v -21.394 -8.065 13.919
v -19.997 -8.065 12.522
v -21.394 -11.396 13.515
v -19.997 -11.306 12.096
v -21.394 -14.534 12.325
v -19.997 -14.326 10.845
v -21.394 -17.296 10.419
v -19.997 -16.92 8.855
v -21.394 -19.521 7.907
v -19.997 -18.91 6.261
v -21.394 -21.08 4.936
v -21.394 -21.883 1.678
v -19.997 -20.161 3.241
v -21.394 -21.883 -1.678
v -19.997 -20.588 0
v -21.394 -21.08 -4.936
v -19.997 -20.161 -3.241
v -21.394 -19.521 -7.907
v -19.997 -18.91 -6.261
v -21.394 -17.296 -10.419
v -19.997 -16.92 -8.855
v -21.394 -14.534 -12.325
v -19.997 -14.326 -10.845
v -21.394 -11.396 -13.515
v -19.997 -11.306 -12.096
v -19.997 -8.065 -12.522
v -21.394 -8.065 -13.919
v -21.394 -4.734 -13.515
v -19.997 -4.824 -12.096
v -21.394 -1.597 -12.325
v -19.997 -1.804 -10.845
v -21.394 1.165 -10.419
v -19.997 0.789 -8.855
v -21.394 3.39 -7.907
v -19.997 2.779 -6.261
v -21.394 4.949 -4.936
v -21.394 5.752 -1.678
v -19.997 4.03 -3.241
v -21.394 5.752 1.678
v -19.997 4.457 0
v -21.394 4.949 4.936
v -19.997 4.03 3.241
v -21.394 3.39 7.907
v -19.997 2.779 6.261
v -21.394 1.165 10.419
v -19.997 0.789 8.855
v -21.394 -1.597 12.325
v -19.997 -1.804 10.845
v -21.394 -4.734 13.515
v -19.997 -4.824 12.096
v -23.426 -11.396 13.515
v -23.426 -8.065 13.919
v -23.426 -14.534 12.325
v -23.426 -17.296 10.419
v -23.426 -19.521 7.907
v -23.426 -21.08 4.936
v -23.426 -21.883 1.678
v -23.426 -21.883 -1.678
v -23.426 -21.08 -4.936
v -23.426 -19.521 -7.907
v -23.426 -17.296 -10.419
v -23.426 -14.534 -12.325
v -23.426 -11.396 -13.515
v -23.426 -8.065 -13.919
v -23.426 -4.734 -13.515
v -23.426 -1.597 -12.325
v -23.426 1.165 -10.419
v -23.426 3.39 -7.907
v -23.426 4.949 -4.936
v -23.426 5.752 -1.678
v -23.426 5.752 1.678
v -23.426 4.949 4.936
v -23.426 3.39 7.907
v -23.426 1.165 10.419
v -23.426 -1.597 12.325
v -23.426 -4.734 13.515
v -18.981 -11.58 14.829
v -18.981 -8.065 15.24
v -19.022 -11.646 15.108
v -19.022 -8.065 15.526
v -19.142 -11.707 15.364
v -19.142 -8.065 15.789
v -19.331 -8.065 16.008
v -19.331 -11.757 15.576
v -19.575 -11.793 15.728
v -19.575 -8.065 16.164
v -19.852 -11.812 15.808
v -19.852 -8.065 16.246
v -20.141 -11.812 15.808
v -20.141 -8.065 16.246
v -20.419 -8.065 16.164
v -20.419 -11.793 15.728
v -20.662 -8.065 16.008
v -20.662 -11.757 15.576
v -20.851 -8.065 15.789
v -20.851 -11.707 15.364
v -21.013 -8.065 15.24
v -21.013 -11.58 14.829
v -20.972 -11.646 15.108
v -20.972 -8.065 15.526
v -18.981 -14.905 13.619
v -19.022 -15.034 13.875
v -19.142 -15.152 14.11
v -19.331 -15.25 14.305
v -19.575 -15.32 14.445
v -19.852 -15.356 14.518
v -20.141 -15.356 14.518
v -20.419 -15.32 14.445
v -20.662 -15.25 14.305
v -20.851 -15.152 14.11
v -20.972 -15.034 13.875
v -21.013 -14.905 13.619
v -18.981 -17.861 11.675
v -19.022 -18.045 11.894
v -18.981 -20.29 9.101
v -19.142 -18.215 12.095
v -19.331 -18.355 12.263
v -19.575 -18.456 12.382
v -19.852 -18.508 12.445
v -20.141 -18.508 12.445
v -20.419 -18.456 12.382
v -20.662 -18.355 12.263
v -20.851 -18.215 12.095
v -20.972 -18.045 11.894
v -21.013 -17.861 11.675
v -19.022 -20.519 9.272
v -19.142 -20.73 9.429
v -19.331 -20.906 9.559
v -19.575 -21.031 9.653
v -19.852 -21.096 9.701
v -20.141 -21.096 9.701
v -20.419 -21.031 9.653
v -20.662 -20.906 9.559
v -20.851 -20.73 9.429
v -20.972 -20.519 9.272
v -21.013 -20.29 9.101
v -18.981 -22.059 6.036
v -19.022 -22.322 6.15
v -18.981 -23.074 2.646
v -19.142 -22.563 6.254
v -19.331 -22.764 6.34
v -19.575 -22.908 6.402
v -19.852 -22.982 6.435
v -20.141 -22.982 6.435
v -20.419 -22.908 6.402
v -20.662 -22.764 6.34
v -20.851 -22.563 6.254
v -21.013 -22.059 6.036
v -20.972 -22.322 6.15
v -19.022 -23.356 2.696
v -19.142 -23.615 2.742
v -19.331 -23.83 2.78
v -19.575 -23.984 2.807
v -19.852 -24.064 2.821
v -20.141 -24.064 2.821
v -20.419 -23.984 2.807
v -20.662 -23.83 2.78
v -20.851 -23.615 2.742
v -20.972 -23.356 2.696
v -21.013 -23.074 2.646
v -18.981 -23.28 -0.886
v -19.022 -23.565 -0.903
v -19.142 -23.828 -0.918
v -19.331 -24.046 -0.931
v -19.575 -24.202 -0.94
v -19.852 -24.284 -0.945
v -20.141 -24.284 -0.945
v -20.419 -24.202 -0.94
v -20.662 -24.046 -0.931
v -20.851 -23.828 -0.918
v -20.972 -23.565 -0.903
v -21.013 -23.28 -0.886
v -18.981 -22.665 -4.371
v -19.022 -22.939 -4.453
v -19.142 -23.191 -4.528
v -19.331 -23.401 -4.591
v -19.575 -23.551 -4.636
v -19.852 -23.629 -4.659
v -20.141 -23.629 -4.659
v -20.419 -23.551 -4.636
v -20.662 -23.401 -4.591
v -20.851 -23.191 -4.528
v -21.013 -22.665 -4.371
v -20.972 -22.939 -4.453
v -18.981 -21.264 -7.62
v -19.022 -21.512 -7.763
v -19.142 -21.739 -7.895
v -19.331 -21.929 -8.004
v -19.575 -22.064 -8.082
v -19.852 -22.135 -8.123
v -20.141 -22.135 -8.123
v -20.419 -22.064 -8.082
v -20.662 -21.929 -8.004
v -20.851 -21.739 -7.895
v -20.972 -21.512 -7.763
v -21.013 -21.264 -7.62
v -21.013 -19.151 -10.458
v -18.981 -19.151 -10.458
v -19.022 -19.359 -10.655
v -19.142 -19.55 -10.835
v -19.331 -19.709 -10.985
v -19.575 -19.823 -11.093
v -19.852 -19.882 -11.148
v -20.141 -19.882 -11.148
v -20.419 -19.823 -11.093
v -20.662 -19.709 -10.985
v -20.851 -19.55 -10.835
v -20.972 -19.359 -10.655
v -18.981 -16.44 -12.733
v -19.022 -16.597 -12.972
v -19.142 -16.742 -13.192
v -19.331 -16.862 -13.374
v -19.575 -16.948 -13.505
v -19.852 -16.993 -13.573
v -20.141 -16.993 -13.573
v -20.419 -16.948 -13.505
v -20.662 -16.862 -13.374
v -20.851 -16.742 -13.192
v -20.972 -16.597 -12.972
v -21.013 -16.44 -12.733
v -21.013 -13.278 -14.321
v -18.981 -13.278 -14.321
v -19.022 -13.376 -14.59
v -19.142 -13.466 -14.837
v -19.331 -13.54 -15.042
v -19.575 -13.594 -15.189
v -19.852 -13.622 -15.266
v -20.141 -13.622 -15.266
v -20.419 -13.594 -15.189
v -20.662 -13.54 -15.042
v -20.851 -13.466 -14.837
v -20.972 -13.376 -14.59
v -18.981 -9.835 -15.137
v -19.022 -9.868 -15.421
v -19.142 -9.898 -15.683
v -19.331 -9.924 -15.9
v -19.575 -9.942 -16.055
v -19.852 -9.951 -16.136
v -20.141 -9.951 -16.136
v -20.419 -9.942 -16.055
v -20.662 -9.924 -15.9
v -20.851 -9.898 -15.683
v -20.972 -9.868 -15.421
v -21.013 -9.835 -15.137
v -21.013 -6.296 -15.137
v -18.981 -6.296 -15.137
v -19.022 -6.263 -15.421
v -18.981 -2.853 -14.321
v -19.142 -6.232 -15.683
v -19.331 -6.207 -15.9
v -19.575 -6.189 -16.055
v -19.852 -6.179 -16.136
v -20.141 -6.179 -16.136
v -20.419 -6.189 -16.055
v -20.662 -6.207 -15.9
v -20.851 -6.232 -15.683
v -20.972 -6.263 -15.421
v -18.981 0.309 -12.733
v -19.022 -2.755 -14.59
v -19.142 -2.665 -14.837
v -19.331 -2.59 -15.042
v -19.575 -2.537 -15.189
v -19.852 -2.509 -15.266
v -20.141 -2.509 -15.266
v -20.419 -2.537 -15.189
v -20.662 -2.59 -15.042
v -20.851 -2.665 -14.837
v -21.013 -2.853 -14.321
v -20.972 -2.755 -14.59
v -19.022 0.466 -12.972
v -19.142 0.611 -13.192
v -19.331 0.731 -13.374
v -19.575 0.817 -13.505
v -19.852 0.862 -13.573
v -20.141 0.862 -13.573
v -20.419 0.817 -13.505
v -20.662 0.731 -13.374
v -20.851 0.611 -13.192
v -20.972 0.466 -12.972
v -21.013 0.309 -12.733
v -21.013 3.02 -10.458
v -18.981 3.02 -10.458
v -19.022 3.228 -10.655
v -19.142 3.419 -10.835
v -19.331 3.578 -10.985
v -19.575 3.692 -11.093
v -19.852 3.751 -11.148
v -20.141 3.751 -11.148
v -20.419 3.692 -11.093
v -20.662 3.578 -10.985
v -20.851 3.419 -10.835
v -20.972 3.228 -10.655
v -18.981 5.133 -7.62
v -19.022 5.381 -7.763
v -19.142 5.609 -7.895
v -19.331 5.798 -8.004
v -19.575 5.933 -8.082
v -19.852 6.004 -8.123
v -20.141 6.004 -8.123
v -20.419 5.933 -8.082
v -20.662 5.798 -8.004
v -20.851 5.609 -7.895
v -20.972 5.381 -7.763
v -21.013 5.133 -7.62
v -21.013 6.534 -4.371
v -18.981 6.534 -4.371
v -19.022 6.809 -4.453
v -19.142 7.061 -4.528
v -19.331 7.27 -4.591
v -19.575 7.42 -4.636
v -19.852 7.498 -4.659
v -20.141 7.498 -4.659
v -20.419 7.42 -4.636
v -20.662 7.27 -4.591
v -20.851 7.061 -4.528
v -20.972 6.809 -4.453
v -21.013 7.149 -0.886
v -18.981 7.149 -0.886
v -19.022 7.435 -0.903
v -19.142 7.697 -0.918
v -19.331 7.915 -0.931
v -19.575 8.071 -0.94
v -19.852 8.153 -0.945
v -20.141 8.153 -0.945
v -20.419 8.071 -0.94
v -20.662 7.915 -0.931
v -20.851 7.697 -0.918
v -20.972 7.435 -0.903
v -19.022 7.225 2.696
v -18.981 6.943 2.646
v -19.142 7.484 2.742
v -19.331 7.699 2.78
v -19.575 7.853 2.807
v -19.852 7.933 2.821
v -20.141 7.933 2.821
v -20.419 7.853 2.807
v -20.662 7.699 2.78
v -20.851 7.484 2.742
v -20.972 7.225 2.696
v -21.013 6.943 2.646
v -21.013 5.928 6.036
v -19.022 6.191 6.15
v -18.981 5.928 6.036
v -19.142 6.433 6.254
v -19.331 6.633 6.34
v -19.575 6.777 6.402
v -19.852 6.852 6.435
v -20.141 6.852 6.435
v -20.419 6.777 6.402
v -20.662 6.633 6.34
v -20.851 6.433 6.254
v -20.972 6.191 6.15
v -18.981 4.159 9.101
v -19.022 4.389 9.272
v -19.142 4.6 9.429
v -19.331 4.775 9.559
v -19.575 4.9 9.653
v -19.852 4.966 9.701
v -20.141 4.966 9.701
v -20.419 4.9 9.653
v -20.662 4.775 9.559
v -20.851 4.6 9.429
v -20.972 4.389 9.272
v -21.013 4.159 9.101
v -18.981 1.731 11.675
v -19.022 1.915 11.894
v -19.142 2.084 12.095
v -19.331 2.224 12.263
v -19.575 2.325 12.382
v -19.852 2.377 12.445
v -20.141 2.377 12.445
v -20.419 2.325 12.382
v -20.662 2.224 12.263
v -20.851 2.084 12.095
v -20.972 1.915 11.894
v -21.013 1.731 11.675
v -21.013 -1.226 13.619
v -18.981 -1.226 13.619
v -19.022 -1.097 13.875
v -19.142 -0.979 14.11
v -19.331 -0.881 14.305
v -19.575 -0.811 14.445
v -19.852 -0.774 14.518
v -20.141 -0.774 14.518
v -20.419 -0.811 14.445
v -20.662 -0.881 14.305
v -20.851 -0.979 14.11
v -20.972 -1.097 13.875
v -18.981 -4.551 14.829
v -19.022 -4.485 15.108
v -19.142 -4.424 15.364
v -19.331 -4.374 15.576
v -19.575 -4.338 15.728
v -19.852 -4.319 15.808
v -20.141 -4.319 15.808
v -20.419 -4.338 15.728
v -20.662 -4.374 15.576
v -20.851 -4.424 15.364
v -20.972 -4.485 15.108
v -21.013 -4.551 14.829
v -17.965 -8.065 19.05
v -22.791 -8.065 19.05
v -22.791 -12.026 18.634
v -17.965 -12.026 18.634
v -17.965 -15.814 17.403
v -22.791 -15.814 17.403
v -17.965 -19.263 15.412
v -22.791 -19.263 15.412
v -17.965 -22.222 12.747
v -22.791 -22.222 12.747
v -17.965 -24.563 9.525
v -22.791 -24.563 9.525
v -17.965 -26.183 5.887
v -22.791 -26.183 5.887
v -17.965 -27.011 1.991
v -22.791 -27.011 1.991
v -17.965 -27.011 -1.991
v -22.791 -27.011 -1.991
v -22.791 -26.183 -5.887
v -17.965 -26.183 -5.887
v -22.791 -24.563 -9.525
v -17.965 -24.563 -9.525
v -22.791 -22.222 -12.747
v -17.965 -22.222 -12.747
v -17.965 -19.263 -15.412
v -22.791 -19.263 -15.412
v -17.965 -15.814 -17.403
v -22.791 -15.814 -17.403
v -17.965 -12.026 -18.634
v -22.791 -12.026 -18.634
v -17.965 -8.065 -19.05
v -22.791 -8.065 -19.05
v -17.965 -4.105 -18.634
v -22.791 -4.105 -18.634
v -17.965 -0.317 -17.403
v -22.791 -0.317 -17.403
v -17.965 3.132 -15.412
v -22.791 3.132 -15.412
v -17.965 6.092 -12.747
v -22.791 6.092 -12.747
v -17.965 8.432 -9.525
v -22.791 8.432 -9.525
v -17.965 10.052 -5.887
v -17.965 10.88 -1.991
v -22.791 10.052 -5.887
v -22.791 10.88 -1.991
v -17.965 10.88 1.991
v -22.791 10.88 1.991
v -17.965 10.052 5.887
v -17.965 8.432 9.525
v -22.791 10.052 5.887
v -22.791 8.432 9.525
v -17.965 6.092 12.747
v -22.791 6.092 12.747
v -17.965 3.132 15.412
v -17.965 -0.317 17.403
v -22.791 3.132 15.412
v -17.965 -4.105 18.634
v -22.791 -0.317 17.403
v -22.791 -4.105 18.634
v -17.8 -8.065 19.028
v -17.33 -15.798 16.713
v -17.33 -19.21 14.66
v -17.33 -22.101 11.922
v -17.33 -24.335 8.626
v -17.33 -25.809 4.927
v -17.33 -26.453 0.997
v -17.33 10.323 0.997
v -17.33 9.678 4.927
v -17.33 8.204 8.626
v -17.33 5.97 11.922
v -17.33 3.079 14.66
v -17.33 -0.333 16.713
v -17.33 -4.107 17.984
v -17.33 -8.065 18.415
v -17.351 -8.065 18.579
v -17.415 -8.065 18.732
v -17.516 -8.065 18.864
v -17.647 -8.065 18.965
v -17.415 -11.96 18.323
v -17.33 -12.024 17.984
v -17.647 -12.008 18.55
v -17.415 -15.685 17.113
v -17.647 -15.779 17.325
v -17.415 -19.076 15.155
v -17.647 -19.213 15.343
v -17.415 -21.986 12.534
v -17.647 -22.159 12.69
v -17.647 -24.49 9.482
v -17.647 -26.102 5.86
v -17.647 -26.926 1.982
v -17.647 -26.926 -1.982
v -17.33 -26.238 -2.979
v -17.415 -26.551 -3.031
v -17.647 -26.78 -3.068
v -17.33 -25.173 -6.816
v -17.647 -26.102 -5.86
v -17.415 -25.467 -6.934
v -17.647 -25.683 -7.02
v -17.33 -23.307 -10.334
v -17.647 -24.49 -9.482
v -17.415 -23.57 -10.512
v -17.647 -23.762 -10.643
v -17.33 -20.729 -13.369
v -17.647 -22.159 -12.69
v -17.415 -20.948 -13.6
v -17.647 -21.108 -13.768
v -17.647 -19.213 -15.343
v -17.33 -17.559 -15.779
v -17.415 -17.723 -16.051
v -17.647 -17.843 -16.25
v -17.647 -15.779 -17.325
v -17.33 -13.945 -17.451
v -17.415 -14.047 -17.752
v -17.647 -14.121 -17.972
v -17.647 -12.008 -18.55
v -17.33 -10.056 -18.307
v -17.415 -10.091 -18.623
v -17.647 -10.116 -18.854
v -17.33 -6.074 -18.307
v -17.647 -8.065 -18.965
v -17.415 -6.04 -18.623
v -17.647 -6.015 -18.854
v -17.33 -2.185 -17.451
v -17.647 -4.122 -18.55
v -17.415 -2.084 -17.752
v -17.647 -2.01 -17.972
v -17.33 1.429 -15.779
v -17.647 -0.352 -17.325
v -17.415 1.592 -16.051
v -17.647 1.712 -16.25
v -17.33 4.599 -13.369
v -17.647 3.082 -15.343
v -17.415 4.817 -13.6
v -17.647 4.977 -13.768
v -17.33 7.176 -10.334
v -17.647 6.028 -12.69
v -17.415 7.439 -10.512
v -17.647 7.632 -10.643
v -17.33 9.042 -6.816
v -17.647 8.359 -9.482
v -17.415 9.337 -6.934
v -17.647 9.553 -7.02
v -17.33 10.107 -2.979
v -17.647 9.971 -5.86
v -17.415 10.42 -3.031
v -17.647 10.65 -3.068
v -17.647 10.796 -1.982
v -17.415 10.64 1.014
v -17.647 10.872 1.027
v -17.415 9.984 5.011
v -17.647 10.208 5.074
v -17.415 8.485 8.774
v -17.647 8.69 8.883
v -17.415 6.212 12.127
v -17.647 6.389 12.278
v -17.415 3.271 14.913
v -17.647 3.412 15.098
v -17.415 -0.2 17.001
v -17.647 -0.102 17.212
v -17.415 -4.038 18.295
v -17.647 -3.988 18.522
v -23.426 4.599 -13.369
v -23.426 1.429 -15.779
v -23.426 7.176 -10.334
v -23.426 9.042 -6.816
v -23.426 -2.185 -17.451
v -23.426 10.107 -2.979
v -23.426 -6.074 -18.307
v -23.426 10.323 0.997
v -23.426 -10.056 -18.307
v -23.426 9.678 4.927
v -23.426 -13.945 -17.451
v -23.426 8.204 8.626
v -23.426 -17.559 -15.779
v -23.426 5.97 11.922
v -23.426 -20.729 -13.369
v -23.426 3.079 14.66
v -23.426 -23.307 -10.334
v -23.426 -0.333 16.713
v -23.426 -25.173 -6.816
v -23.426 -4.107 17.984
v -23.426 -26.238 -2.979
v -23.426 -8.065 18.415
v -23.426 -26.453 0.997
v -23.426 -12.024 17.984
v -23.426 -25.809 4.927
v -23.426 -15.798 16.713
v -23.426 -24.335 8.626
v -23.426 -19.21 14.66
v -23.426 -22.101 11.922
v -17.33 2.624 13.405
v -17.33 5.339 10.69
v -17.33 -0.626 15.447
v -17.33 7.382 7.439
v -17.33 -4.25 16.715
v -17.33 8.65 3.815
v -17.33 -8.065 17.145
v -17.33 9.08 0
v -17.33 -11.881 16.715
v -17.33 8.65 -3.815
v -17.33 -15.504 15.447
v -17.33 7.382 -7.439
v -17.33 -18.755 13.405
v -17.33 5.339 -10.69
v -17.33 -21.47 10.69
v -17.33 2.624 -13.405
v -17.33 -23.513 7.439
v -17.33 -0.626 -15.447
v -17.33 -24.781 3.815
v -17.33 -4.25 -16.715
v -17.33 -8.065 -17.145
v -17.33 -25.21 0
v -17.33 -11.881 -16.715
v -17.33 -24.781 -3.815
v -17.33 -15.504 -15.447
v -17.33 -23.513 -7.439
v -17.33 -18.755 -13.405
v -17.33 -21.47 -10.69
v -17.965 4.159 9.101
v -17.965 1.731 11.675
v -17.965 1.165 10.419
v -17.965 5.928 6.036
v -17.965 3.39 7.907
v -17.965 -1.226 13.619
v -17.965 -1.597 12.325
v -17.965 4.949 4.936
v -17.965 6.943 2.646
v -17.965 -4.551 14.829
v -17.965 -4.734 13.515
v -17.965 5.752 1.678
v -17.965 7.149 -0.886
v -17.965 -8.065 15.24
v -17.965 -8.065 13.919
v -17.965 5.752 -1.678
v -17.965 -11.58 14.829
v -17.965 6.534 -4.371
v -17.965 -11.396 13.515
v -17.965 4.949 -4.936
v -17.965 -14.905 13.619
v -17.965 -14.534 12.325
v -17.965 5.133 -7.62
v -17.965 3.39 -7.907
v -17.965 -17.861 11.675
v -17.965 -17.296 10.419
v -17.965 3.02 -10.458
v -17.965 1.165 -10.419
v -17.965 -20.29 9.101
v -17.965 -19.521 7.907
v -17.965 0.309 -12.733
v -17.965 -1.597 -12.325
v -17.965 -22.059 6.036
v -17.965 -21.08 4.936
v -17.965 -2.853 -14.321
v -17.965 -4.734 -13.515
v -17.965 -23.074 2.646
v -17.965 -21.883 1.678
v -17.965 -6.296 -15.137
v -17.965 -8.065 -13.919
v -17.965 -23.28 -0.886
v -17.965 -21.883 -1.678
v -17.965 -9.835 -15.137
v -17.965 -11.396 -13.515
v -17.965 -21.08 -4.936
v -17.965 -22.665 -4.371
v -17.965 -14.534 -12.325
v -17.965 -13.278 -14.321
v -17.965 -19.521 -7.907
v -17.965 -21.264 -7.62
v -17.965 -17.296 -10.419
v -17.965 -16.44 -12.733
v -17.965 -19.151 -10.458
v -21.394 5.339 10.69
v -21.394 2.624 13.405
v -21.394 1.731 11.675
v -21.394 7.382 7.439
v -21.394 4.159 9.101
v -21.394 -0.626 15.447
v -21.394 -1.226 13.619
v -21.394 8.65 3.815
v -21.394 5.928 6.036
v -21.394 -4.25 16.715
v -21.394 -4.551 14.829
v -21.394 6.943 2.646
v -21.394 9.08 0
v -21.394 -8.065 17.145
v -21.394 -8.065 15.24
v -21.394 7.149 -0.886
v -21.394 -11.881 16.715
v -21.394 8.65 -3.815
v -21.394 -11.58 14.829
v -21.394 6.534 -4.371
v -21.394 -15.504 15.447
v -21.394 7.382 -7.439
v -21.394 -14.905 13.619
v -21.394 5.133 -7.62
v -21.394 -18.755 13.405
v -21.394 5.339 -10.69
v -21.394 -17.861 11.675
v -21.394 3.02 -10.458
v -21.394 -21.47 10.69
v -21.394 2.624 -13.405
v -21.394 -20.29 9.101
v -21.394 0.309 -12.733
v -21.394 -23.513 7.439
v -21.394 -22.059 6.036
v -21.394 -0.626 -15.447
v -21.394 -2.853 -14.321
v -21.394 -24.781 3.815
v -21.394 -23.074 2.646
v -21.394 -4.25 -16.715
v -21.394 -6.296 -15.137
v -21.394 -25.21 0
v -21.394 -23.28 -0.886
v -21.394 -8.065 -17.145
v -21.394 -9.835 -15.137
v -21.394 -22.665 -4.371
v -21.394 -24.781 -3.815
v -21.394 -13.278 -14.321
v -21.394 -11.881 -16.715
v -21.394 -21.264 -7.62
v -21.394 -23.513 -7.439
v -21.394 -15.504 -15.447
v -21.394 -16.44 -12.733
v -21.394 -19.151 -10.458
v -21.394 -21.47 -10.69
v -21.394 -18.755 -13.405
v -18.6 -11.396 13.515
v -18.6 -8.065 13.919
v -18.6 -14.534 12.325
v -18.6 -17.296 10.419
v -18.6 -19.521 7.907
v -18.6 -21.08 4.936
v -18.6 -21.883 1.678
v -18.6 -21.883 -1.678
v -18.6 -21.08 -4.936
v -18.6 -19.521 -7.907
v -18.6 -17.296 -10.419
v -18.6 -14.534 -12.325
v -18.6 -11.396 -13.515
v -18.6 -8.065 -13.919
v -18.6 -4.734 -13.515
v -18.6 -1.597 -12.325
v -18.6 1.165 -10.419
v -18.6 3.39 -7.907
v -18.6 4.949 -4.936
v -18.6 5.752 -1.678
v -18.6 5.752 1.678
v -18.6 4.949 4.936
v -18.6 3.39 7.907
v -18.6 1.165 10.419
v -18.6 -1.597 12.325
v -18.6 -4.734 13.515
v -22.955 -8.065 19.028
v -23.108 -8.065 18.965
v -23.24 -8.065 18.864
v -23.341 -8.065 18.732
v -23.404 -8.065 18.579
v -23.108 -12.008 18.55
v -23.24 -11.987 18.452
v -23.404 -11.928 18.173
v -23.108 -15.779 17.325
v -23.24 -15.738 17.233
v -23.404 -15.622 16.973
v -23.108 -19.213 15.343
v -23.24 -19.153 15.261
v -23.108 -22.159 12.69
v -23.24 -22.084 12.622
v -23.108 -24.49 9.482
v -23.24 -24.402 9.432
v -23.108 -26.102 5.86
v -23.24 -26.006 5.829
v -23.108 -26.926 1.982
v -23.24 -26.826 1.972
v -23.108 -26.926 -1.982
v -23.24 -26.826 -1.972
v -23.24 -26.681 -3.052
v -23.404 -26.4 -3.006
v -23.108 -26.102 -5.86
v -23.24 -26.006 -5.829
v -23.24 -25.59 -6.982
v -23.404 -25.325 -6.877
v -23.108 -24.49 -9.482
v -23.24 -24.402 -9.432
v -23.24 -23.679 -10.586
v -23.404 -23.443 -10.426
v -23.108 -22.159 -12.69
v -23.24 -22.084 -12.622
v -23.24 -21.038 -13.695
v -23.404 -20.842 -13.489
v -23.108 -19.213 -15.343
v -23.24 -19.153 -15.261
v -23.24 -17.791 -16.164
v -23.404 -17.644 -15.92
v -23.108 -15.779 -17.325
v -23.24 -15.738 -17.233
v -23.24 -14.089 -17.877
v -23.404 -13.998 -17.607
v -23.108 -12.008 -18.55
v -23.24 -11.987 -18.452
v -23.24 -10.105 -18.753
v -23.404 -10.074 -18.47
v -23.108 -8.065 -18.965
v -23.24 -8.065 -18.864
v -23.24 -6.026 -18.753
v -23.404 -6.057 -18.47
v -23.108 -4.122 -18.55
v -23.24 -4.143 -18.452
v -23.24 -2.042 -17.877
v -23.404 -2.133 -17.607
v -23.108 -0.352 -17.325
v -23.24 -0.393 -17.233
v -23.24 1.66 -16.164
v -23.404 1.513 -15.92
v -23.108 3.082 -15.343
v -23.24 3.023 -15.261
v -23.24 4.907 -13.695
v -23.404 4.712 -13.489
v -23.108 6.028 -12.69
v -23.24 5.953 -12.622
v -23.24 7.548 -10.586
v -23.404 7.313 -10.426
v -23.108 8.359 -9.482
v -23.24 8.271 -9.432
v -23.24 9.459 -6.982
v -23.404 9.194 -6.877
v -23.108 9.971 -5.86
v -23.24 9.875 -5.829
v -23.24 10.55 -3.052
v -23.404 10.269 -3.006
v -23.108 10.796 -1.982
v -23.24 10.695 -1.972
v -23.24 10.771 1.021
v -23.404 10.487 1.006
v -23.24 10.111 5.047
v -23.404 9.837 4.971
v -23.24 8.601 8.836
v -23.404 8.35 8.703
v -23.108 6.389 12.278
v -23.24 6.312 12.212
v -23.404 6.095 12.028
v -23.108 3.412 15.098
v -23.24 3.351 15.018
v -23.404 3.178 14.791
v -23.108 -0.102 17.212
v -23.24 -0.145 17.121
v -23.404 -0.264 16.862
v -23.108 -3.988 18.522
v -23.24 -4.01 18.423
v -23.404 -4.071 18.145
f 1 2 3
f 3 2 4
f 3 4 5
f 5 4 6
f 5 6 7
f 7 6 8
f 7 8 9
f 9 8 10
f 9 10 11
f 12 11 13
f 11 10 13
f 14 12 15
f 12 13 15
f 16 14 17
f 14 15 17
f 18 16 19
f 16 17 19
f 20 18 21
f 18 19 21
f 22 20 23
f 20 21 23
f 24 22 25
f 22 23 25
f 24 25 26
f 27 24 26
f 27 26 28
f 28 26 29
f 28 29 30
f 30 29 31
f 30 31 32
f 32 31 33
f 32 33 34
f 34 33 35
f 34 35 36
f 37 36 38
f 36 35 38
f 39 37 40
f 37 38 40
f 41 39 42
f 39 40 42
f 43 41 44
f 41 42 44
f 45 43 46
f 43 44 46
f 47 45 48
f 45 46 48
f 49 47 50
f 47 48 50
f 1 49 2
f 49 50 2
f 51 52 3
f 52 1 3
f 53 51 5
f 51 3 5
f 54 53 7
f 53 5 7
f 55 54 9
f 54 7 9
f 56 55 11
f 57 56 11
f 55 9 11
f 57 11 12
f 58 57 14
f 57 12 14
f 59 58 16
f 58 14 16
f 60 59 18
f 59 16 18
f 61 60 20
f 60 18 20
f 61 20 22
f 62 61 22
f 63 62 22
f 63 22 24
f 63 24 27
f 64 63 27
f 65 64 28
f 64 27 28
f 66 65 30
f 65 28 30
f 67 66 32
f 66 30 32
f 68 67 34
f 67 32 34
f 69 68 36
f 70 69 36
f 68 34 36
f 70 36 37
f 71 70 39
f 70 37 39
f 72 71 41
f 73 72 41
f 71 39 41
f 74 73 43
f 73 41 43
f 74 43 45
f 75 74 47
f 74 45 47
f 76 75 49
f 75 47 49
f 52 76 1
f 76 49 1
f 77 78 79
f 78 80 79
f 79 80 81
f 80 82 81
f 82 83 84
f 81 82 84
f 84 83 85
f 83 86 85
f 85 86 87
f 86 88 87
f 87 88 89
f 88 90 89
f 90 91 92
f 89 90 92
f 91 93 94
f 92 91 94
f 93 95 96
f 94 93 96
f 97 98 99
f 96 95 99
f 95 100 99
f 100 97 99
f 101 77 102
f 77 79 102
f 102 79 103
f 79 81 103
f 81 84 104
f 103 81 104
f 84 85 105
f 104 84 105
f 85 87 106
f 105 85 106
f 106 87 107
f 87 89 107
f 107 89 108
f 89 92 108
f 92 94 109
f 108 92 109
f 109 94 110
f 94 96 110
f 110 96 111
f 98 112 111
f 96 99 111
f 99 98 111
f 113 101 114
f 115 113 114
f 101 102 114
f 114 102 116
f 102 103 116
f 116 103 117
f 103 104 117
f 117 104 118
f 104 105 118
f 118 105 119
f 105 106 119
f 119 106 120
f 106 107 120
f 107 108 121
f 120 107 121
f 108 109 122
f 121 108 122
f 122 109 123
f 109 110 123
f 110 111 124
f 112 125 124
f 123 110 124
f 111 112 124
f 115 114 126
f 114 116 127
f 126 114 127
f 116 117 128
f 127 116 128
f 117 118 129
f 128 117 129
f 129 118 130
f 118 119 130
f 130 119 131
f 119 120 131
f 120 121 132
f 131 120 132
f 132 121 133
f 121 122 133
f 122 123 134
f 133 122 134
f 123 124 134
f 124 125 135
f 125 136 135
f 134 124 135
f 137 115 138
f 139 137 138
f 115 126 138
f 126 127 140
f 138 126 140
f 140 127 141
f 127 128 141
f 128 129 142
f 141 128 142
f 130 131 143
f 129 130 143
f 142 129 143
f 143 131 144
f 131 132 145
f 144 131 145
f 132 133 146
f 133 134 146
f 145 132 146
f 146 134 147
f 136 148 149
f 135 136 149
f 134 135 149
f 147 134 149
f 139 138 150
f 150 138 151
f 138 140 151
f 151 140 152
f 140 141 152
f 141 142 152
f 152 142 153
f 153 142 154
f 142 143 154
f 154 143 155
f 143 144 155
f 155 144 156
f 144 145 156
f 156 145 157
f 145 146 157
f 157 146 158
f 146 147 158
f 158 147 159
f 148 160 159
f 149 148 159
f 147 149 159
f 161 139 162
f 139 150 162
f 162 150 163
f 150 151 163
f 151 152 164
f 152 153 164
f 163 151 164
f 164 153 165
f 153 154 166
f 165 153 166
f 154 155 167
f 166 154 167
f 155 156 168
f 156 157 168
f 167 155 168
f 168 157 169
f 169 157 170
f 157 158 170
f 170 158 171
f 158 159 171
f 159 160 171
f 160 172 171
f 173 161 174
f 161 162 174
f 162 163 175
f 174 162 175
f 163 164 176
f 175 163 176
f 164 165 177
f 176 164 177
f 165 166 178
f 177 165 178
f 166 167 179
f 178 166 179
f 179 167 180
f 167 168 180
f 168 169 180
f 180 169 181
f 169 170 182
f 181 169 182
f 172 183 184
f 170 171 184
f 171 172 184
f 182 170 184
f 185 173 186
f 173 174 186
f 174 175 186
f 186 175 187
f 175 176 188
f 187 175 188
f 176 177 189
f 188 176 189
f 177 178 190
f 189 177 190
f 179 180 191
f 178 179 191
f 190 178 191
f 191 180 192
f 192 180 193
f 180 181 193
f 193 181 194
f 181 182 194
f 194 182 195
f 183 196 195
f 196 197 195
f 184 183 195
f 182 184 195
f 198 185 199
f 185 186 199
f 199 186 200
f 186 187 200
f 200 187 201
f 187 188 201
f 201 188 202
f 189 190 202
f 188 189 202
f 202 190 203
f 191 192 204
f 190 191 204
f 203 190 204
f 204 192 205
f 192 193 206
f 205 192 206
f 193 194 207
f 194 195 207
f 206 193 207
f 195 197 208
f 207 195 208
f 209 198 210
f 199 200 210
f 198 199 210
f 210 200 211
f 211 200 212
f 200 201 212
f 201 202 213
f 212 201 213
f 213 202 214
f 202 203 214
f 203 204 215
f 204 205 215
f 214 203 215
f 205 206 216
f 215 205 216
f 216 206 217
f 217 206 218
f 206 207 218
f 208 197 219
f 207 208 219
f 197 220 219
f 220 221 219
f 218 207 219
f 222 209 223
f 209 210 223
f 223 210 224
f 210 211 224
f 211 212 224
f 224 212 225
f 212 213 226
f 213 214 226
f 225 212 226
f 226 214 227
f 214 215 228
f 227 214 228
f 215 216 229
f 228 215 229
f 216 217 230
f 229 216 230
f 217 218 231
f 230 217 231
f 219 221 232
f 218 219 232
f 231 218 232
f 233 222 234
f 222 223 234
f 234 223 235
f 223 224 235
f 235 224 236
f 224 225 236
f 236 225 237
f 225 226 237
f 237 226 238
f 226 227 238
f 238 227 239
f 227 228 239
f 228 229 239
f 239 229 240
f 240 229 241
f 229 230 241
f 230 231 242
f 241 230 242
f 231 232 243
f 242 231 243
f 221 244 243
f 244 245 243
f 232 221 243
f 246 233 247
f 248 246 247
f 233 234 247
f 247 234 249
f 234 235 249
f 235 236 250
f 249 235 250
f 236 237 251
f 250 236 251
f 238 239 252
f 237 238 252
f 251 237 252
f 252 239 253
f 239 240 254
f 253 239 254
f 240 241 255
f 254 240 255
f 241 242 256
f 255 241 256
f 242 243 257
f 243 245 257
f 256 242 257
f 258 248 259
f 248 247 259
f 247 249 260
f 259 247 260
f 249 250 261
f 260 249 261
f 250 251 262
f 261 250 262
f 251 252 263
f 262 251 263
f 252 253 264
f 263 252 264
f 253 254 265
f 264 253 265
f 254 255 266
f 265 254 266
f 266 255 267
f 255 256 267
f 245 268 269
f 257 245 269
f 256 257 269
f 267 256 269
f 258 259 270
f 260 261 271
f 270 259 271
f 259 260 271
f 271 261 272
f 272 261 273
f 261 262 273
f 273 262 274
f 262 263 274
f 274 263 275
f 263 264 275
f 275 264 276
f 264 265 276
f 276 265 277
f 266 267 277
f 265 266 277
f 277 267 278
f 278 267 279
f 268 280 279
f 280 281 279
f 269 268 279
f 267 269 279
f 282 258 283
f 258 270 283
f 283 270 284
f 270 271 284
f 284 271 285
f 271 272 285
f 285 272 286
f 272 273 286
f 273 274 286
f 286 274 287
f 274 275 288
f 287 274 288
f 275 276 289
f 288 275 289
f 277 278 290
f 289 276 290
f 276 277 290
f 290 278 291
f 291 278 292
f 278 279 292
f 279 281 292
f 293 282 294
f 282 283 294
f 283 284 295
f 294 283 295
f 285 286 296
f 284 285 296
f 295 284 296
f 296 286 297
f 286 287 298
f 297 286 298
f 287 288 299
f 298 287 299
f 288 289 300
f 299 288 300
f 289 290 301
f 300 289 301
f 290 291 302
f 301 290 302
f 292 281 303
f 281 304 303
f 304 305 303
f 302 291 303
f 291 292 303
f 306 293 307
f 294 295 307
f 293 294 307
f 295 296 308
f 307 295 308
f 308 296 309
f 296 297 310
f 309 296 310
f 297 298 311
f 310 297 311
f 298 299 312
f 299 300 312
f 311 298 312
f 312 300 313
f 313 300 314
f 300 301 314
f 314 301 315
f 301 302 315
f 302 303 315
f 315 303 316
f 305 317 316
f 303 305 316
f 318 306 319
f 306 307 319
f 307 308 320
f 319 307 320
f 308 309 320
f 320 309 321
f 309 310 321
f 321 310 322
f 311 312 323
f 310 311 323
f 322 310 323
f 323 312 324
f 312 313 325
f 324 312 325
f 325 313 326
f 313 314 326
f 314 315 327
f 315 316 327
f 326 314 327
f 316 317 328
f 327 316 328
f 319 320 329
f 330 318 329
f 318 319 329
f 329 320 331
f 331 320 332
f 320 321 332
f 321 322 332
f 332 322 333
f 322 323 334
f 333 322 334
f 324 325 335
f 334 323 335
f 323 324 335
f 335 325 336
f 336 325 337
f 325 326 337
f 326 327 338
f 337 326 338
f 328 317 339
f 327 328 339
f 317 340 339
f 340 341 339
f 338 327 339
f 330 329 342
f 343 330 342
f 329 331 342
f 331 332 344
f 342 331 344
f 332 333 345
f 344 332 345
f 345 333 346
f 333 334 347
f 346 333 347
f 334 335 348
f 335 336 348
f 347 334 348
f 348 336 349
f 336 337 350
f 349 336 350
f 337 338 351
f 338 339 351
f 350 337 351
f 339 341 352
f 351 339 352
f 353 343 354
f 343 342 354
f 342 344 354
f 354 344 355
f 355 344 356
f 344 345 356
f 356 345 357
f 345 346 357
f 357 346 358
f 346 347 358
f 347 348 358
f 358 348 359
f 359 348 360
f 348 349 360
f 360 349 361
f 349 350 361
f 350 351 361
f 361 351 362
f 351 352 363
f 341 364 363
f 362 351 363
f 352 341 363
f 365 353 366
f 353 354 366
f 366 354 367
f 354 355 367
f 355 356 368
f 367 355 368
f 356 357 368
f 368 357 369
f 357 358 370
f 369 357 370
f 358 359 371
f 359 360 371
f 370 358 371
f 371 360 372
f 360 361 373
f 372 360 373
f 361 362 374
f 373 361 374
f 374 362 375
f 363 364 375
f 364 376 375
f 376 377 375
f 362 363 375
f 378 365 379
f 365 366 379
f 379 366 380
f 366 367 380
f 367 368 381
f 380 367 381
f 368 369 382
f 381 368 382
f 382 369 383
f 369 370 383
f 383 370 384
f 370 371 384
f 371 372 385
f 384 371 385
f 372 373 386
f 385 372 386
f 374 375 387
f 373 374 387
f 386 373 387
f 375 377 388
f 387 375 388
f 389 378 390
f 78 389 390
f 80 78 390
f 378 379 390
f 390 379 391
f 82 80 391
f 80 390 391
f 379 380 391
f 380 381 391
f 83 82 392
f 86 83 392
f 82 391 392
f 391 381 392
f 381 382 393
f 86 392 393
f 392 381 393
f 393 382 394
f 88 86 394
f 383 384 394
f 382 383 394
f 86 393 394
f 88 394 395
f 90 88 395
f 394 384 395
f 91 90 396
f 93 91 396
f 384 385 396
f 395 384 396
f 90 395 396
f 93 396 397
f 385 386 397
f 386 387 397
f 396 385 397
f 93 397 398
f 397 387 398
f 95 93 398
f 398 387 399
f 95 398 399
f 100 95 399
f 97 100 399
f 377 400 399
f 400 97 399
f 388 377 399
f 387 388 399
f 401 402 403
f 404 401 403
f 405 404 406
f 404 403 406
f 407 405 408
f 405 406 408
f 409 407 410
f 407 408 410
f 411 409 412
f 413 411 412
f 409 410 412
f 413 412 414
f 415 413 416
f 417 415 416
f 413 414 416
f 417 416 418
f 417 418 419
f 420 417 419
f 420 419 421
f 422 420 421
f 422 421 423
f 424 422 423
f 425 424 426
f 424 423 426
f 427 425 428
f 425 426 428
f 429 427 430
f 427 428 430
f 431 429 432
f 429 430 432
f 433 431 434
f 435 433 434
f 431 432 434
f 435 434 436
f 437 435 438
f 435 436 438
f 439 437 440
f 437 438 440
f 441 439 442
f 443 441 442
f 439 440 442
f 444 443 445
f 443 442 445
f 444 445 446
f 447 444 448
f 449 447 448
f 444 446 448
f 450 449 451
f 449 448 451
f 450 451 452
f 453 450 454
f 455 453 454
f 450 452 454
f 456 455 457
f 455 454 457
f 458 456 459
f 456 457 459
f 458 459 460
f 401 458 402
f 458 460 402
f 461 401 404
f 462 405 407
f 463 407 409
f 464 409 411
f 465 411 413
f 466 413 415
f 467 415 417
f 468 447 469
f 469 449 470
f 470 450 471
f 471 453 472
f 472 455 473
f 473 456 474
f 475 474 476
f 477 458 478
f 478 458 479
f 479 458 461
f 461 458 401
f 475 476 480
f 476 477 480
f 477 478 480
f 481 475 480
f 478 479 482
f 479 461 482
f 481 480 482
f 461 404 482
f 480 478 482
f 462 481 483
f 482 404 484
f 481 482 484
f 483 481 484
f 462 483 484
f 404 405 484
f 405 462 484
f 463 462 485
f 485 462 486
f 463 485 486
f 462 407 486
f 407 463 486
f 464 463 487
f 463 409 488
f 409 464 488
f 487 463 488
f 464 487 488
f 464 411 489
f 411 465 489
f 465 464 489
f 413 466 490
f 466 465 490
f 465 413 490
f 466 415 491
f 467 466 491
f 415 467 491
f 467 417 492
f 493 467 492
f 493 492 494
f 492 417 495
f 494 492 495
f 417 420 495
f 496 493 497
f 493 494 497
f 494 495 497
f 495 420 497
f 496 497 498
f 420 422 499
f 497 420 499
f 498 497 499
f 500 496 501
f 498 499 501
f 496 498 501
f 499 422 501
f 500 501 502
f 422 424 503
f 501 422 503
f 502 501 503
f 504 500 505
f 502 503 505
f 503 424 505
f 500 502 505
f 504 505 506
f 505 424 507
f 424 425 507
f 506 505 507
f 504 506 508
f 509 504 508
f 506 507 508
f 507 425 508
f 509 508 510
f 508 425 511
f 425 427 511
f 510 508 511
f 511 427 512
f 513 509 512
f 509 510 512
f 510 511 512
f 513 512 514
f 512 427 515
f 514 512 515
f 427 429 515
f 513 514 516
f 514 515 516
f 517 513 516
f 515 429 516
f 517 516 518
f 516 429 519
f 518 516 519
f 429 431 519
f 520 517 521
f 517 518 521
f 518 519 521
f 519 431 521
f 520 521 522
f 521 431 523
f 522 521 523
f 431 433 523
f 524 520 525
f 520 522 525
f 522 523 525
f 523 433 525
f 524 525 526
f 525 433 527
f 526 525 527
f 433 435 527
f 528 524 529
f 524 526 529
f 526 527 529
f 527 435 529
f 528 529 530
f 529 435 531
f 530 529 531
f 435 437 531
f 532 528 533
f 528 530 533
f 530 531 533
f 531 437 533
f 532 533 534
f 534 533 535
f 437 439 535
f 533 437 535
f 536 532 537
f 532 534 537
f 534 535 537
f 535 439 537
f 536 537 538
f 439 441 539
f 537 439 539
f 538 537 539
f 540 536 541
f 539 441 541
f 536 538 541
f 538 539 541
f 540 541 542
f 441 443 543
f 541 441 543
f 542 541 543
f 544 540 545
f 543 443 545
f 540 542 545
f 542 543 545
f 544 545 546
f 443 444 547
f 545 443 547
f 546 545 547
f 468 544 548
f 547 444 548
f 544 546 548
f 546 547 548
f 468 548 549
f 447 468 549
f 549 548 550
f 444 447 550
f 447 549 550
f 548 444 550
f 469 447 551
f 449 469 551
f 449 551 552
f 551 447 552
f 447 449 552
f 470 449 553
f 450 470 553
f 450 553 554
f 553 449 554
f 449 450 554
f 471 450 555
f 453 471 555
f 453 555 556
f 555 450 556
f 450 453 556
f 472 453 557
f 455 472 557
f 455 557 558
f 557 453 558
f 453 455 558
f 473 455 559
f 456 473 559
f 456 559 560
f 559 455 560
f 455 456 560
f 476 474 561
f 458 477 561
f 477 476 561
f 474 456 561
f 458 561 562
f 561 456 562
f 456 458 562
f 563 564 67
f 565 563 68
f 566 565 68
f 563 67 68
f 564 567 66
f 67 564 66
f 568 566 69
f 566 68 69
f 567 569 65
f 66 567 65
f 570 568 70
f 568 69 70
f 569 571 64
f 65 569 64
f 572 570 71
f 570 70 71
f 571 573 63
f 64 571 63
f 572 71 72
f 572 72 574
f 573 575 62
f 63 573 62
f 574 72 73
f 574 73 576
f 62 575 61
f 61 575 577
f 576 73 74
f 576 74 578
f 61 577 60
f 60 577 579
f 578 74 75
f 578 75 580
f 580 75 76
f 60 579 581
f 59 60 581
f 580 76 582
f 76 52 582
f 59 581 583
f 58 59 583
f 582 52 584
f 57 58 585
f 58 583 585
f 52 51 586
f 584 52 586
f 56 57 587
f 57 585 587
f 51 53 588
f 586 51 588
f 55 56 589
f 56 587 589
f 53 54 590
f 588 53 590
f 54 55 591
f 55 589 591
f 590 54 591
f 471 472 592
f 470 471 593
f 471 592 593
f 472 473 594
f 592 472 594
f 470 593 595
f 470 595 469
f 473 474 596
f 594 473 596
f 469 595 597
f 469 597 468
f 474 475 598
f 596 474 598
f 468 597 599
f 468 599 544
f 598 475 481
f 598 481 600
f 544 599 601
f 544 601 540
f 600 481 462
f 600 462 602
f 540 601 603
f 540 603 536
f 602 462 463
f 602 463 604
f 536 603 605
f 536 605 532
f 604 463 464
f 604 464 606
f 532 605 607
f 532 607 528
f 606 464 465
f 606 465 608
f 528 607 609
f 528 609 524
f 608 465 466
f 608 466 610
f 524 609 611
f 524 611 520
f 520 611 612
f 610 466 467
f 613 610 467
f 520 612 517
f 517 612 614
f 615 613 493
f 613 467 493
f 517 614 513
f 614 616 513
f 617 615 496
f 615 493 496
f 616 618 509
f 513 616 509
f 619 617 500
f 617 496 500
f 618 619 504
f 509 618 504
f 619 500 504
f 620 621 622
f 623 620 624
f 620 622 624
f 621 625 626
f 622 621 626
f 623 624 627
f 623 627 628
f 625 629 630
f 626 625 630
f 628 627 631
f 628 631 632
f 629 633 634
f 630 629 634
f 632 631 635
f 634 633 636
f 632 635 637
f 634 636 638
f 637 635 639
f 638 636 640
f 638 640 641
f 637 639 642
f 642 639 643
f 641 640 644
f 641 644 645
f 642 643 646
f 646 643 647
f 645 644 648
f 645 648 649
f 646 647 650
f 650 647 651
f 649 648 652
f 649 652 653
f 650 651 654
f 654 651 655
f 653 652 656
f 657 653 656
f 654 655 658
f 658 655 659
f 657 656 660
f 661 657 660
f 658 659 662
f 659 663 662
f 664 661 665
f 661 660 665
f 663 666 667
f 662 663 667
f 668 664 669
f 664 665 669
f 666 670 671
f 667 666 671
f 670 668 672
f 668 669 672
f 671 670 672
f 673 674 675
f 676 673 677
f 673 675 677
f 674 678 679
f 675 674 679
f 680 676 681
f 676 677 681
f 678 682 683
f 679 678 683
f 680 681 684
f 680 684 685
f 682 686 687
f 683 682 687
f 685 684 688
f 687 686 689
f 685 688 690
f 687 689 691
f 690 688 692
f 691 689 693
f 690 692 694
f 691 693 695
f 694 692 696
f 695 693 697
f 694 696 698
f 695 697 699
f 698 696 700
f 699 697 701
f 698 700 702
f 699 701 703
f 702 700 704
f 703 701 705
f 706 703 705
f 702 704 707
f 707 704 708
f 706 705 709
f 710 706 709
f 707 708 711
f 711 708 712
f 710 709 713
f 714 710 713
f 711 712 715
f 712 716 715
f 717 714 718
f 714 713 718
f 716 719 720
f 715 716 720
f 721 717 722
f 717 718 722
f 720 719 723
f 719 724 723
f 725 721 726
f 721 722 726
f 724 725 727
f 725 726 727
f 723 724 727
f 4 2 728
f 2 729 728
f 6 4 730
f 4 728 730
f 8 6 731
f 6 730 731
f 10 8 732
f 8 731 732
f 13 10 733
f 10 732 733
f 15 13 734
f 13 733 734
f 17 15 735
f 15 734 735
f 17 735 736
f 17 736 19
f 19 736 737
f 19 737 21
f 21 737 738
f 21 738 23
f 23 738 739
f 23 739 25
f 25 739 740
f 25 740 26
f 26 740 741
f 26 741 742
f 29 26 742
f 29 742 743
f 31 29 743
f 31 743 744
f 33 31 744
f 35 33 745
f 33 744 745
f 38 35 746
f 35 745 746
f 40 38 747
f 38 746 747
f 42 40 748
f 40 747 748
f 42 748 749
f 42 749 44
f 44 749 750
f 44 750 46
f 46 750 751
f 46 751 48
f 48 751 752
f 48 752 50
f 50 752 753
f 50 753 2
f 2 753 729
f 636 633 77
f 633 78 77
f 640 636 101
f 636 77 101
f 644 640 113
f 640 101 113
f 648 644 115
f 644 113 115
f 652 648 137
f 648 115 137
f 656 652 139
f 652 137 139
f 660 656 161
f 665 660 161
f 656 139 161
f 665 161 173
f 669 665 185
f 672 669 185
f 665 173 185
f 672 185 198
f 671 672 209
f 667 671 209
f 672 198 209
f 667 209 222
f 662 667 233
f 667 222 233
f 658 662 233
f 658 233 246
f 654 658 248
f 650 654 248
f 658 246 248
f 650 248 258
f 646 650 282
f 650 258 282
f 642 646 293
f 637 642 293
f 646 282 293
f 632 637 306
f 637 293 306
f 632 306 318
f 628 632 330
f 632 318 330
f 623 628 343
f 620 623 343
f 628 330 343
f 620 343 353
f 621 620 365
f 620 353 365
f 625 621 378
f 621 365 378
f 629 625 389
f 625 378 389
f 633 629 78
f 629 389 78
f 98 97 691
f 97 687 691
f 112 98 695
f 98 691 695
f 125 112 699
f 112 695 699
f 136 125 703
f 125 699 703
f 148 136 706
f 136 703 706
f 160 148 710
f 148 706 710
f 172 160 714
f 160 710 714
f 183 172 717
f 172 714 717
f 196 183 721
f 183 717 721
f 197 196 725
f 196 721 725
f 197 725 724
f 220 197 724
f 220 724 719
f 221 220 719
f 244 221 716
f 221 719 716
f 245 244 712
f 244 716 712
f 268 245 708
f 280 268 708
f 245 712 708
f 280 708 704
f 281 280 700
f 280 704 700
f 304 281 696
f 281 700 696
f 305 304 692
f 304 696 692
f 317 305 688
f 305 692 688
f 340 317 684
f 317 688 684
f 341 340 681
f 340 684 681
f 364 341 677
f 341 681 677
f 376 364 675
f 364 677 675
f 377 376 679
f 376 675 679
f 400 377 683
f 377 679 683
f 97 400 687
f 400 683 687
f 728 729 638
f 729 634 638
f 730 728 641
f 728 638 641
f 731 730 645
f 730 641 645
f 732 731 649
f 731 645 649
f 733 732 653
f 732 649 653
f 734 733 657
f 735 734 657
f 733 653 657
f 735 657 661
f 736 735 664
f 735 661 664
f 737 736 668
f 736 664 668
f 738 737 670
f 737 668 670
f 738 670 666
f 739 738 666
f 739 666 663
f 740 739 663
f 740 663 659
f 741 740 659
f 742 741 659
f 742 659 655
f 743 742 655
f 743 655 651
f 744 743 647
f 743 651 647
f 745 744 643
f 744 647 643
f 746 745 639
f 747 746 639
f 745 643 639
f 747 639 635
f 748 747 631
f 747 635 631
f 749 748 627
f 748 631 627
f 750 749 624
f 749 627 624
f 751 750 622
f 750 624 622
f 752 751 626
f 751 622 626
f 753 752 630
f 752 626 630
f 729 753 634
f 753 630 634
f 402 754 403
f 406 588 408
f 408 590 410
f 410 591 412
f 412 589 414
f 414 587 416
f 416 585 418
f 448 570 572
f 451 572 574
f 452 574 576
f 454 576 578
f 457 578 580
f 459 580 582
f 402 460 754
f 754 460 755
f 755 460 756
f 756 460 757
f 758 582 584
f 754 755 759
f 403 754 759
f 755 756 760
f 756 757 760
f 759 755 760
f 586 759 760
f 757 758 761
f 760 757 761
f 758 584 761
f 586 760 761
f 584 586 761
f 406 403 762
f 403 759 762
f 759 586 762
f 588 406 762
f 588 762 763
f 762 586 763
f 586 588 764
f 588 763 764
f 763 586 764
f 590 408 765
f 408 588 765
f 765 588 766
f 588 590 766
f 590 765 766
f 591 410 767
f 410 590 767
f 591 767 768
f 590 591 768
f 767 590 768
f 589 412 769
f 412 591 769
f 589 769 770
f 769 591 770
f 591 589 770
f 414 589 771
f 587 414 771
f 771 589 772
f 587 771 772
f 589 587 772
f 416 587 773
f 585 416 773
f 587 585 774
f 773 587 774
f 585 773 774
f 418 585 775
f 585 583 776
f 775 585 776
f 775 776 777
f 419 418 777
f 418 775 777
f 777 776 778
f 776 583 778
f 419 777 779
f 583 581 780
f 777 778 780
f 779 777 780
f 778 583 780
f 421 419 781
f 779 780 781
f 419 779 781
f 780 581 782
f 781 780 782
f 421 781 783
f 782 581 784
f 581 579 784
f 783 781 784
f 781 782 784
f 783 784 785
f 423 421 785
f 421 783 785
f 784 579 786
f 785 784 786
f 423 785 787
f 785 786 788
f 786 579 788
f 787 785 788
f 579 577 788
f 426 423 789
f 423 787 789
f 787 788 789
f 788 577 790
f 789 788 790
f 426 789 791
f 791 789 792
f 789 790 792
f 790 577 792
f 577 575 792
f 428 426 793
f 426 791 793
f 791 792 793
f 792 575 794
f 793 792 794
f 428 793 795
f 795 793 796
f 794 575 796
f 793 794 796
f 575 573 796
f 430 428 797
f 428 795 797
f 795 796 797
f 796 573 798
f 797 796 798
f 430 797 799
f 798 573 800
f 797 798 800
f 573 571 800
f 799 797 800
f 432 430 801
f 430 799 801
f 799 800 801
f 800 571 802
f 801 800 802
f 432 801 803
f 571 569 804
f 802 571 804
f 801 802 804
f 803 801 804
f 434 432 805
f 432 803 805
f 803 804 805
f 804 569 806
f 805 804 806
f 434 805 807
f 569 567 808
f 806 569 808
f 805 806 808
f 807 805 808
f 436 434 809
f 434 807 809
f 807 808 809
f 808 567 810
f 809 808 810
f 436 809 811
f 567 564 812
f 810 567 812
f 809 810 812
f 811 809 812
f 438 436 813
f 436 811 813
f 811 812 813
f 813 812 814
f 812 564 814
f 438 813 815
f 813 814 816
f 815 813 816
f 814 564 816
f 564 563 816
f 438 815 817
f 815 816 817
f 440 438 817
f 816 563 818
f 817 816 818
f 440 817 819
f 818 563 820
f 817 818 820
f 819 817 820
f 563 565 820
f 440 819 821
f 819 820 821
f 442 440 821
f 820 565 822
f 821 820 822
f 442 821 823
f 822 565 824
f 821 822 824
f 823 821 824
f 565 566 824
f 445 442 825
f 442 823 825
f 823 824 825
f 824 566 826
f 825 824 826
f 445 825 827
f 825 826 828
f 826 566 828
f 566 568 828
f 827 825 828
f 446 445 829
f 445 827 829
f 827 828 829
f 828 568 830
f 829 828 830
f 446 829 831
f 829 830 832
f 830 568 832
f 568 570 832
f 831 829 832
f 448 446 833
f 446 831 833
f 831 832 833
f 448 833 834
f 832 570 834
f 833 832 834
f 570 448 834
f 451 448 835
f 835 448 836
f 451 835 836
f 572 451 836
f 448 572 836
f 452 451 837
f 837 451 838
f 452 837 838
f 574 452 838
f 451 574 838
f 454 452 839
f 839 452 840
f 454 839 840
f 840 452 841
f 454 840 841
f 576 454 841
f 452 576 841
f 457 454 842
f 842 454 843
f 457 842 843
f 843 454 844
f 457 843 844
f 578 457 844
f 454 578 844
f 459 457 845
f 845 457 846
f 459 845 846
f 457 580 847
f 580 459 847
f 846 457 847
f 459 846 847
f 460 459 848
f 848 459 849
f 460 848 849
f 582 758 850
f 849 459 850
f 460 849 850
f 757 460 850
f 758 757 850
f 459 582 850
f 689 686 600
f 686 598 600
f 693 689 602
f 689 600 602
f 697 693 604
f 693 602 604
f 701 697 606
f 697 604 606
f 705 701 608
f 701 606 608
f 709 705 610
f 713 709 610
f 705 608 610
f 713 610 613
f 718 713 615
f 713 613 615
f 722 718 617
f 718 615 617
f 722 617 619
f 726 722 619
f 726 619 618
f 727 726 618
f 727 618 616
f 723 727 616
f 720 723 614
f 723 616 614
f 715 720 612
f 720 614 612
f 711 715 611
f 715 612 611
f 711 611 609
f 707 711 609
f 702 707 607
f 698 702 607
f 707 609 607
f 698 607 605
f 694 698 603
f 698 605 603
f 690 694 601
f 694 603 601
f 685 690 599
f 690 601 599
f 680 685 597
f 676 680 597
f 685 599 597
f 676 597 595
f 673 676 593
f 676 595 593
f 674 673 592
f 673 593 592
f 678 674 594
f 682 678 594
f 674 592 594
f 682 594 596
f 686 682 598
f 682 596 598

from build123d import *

# Parameters (mm, degrees)
FILLET1_R = 0.635


with BuildPart() as part:
    # Sketch1 → Revolve1 (revolve)
    with BuildSketch(Plane.XY, mode=Mode.PRIVATE) as revolve1_sk:
        with BuildLine():
            Line((-23.425738216, 5.85380266), (-21.393738216, 5.85380266))
            Line((-21.393738216, 5.85380266), (-19.996738216, 4.45680266))
            Line((-19.996738216, 4.45680266), (-18.599738216, 5.85380266))
            Line((-18.599738216, 5.85380266), (-17.964738216, 5.85380266))
            Line((-17.964738216, 5.85380266), (-17.964738216, 7.17460266))
            Line((-17.964738216, 7.17460266), (-18.980738216, 7.17460266))
            ThreePointArc((-18.980738216, 7.17460266), (-19.996738216, 8.19060266), (-21.012738216, 7.17460266))
            Line((-21.012738216, 7.17460266), (-21.393738216, 7.17460266))
            Line((-21.393738216, 7.17460266), (-21.393738216, 9.07960266))
            Line((-21.393738216, 9.07960266), (-17.329738216, 9.07960266))
            Line((-17.329738216, 9.07960266), (-17.329738216, 10.98460266))
            Line((-17.329738216, 10.98460266), (-23.425738216, 10.98460266))
            Line((-23.425738216, 10.98460266), (-23.425738216, 9.07960266))
            Line((-23.425738216, 9.07960266), (-23.425738216, 5.85380266))
        make_face()
    revolve(revolve1_sk.sketch.rotate(Axis((-23.425738216, -8.06539734, 0), (1, 0, 0)), 90), axis=Axis((-23.425738216, -8.06539734, 0), (1, 0, 0)))

    # Fillet1
    fillet1_edges = [part.edges().sort_by_distance(p)[0] for p in [
        (-17.329738216, -8.06539734, -19.05),
        (-23.425738216, -8.06539734, -19.05),
    ]]
    fillet(fillet1_edges, radius=FILLET1_R)


solid = part.part
